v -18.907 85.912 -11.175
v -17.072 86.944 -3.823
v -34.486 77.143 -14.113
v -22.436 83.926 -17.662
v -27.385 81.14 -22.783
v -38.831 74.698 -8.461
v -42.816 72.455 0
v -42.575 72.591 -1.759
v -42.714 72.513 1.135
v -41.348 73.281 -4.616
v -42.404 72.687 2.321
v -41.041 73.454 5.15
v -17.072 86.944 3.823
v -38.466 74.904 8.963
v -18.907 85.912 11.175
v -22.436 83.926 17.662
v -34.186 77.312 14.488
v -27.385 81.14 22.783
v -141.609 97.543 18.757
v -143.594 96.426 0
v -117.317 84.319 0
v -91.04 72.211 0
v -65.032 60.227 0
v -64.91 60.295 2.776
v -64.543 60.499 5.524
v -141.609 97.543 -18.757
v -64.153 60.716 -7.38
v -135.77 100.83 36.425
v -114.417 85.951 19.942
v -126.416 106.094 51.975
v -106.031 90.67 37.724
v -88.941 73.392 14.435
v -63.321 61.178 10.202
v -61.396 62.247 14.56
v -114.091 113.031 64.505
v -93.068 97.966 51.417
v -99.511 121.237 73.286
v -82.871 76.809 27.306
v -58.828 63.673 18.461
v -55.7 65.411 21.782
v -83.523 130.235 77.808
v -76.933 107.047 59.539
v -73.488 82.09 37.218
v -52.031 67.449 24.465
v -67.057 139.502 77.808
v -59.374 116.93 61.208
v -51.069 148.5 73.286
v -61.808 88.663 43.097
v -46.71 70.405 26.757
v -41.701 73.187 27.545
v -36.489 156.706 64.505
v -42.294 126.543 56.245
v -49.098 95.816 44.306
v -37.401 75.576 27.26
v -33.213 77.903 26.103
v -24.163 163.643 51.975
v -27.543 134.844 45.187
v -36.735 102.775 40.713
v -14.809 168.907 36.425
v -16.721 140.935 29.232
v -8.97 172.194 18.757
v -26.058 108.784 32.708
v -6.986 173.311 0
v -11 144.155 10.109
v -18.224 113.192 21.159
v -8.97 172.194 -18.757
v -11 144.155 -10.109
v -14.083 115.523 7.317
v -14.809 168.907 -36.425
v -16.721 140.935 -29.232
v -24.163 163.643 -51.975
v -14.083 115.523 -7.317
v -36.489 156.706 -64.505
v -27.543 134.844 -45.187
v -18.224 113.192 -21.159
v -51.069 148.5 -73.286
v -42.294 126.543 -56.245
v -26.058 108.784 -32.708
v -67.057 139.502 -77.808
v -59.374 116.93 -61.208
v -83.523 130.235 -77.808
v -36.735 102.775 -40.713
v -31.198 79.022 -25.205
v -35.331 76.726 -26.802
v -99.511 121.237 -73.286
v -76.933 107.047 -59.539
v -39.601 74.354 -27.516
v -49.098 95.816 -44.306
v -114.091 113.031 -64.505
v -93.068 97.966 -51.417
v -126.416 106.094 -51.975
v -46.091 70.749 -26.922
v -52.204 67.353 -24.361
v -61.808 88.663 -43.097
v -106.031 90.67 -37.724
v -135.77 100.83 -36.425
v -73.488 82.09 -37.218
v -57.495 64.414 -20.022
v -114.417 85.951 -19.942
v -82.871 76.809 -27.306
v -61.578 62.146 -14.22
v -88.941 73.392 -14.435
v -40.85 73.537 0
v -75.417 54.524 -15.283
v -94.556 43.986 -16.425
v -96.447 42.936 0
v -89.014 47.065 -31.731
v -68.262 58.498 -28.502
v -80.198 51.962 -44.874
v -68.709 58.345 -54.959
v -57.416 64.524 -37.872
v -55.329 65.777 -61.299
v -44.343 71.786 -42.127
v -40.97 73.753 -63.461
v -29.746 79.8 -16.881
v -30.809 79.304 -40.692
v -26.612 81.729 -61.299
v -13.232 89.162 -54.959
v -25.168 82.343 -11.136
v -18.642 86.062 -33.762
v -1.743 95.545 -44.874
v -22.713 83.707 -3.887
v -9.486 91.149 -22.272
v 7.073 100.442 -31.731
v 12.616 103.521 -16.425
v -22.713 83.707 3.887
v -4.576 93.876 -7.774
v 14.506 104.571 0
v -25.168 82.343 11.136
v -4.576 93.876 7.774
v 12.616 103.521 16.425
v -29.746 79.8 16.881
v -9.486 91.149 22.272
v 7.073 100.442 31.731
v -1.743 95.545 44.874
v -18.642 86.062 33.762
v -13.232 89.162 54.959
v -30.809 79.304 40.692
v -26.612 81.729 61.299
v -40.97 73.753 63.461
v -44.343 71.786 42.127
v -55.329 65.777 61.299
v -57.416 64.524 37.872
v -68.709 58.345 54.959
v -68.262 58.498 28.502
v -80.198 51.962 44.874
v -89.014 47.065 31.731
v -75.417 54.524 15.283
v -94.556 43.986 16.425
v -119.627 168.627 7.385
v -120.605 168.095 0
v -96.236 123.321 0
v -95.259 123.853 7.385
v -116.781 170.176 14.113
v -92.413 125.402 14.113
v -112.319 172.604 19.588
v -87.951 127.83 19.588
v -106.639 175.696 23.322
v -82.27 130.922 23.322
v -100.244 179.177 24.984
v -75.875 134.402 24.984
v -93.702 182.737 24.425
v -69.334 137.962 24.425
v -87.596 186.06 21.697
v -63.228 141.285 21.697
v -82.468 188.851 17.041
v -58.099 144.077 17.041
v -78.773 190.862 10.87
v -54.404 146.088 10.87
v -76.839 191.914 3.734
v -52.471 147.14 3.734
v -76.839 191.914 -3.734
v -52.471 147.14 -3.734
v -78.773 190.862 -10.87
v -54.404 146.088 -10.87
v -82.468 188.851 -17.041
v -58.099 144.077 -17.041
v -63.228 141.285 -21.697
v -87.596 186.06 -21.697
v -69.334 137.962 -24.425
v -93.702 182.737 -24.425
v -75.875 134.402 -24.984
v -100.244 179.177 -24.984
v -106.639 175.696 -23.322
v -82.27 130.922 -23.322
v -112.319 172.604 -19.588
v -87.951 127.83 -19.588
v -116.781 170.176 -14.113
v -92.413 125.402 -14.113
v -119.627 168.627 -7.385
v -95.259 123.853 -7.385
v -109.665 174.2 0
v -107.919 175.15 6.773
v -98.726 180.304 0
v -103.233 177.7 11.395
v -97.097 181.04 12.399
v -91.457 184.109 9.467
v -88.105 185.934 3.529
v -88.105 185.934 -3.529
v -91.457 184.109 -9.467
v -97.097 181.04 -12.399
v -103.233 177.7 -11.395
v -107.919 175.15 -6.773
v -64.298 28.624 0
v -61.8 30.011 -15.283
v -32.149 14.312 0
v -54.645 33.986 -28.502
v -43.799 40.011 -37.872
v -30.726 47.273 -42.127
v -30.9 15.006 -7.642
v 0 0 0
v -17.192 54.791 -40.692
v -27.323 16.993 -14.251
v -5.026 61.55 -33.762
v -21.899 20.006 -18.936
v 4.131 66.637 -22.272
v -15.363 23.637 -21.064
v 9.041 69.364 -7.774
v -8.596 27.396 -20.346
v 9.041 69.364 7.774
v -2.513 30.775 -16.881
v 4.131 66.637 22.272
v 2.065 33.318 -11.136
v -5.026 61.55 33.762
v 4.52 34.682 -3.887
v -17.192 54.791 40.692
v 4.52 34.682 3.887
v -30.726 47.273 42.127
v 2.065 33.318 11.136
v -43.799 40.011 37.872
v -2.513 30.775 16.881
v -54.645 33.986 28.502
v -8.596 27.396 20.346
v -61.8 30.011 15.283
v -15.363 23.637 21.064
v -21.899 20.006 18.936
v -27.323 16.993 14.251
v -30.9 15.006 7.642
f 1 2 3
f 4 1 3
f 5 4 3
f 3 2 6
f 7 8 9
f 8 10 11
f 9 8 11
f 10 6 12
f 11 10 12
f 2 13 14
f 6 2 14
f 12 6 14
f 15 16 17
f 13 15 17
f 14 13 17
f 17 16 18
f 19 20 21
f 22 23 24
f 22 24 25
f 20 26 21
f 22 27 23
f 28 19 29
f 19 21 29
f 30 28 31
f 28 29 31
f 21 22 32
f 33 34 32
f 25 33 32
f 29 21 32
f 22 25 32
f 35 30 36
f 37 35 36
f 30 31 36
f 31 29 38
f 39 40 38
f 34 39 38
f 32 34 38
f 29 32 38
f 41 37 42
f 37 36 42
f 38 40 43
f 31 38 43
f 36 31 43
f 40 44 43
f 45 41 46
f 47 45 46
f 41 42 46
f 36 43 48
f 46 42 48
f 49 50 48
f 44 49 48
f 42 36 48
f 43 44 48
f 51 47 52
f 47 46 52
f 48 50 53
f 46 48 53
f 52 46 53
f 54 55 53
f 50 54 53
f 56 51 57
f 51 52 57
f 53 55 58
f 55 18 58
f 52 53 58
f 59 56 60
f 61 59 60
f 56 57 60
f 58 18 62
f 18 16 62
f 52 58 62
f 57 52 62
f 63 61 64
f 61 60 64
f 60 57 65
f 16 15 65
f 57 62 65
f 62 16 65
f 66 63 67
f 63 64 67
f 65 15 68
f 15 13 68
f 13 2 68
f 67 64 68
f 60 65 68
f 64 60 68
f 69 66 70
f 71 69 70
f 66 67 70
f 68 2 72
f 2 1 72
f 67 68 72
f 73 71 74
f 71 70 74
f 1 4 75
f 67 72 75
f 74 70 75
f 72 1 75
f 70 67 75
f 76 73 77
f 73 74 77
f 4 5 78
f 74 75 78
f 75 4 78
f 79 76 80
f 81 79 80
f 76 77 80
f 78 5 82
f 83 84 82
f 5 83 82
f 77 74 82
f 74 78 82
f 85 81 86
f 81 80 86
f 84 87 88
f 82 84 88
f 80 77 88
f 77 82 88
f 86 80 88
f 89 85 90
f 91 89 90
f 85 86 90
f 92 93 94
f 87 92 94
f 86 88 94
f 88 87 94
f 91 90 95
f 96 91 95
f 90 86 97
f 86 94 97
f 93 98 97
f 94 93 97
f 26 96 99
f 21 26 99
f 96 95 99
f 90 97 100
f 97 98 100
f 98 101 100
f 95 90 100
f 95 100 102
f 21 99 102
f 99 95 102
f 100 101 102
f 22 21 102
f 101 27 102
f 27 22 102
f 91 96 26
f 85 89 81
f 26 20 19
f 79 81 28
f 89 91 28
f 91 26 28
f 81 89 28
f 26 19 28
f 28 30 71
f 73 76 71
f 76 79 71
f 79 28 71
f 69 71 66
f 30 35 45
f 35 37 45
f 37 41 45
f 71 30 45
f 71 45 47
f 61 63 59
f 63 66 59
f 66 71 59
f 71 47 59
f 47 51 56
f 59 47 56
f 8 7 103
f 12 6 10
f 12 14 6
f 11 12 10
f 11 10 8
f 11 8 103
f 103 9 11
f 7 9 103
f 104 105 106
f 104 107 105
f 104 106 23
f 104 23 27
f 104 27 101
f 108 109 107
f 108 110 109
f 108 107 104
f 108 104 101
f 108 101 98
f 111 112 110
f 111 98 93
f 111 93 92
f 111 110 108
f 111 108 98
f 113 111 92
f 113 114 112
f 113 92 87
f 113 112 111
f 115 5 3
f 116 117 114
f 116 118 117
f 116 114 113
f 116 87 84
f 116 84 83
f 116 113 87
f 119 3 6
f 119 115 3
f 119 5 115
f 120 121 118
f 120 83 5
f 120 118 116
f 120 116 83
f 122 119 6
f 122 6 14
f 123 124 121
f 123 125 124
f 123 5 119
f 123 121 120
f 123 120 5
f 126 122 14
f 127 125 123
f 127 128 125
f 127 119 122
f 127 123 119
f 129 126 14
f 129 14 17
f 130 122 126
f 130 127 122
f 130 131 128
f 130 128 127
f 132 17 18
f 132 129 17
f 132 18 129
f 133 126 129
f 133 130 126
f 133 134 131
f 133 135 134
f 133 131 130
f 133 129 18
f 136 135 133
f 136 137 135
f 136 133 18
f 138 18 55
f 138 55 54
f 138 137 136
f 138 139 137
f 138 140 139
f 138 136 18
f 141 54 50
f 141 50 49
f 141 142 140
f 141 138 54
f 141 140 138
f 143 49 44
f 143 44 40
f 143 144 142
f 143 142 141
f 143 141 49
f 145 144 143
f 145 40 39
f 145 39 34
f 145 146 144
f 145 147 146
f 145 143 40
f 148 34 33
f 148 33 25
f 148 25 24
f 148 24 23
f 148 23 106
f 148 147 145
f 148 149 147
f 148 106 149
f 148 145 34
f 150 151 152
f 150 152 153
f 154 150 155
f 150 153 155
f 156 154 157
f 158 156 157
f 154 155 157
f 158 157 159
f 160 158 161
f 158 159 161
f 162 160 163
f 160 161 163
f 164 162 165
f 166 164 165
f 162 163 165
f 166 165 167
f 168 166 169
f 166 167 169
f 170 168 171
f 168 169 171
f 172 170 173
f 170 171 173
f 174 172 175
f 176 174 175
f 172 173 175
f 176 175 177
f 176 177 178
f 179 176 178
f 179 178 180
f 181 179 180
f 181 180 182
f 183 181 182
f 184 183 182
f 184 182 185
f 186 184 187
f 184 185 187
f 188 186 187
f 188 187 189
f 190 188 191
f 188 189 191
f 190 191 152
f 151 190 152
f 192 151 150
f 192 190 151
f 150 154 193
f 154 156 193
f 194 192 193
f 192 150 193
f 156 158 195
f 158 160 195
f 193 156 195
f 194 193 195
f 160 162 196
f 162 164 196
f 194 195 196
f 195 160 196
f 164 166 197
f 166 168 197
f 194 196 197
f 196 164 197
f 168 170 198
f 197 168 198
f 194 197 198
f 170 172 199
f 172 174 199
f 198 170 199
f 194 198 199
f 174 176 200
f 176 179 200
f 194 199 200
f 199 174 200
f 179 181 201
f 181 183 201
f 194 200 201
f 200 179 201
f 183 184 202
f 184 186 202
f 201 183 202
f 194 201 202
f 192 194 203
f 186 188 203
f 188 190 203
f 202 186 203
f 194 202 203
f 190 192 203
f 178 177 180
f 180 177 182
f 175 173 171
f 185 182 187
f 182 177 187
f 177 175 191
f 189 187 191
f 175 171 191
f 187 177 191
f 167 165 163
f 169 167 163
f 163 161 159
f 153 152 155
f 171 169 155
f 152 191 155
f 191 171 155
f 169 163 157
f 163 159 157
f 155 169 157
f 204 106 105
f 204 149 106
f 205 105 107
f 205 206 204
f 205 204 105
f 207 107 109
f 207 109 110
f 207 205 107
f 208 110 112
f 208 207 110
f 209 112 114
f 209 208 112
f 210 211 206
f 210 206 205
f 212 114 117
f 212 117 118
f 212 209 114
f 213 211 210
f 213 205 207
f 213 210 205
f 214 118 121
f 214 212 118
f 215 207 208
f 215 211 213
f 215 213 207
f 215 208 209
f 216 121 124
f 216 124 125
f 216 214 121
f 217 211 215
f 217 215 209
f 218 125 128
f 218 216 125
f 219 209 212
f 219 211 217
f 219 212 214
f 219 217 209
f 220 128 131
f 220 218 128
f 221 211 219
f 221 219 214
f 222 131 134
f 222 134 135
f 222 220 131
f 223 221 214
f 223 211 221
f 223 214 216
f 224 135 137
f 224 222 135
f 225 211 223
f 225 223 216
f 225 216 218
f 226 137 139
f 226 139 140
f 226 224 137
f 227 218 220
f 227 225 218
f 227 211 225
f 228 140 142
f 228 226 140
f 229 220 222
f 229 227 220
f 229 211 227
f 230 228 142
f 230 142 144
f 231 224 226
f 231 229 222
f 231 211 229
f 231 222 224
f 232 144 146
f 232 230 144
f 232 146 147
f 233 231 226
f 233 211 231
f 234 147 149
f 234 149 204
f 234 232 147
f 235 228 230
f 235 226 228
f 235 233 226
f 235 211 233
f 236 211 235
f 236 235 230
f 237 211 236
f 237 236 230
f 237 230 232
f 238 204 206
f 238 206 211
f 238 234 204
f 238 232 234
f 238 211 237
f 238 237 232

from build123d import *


with BuildPart() as f1:
    # F0 (on Top) → F1 (revolve)
    with BuildSketch(Plane.XY):
        Polygon((-143.5940553443, 96.4263659024), (-64.7635832429, 60.1030886173), (-40.8013239503, 73.5892578959), (-75.2898557049, 134.8685673463), align=None)
    revolve(axis=Axis((-58.0455898276, 104.2289126211, 0), (-0.4904656207, 0.8714605412, 0)))

    # F4 (on Top) → F5 (revolve)
    with BuildSketch(Plane.XY):
        Polygon((0, 0), (-40.8504121006, 73.5372751951), (-96.4467450976, 42.9359376431), align=None)
    revolve(axis=Axis((-20.4252060503, 36.7686375976, 0), (0.4856099594, -0.874175593, 0)))


with BuildPart() as f3:
    # F2 (on Top) → F3 (revolve)
    with BuildSketch(Plane.XY):
        Polygon((-96.2362736464, 123.3206540346), (-74.2306772893, 135.2972002293), (-98.7256292395, 180.3040007409), (-120.6047495267, 168.0950685733), align=None)
    revolve(axis=Axis((-86.4781532644, 157.8006004851, 0), (-0.4780365342, 0.8783399524, 0)))


solid = Compound([f1.part, f3.part])
